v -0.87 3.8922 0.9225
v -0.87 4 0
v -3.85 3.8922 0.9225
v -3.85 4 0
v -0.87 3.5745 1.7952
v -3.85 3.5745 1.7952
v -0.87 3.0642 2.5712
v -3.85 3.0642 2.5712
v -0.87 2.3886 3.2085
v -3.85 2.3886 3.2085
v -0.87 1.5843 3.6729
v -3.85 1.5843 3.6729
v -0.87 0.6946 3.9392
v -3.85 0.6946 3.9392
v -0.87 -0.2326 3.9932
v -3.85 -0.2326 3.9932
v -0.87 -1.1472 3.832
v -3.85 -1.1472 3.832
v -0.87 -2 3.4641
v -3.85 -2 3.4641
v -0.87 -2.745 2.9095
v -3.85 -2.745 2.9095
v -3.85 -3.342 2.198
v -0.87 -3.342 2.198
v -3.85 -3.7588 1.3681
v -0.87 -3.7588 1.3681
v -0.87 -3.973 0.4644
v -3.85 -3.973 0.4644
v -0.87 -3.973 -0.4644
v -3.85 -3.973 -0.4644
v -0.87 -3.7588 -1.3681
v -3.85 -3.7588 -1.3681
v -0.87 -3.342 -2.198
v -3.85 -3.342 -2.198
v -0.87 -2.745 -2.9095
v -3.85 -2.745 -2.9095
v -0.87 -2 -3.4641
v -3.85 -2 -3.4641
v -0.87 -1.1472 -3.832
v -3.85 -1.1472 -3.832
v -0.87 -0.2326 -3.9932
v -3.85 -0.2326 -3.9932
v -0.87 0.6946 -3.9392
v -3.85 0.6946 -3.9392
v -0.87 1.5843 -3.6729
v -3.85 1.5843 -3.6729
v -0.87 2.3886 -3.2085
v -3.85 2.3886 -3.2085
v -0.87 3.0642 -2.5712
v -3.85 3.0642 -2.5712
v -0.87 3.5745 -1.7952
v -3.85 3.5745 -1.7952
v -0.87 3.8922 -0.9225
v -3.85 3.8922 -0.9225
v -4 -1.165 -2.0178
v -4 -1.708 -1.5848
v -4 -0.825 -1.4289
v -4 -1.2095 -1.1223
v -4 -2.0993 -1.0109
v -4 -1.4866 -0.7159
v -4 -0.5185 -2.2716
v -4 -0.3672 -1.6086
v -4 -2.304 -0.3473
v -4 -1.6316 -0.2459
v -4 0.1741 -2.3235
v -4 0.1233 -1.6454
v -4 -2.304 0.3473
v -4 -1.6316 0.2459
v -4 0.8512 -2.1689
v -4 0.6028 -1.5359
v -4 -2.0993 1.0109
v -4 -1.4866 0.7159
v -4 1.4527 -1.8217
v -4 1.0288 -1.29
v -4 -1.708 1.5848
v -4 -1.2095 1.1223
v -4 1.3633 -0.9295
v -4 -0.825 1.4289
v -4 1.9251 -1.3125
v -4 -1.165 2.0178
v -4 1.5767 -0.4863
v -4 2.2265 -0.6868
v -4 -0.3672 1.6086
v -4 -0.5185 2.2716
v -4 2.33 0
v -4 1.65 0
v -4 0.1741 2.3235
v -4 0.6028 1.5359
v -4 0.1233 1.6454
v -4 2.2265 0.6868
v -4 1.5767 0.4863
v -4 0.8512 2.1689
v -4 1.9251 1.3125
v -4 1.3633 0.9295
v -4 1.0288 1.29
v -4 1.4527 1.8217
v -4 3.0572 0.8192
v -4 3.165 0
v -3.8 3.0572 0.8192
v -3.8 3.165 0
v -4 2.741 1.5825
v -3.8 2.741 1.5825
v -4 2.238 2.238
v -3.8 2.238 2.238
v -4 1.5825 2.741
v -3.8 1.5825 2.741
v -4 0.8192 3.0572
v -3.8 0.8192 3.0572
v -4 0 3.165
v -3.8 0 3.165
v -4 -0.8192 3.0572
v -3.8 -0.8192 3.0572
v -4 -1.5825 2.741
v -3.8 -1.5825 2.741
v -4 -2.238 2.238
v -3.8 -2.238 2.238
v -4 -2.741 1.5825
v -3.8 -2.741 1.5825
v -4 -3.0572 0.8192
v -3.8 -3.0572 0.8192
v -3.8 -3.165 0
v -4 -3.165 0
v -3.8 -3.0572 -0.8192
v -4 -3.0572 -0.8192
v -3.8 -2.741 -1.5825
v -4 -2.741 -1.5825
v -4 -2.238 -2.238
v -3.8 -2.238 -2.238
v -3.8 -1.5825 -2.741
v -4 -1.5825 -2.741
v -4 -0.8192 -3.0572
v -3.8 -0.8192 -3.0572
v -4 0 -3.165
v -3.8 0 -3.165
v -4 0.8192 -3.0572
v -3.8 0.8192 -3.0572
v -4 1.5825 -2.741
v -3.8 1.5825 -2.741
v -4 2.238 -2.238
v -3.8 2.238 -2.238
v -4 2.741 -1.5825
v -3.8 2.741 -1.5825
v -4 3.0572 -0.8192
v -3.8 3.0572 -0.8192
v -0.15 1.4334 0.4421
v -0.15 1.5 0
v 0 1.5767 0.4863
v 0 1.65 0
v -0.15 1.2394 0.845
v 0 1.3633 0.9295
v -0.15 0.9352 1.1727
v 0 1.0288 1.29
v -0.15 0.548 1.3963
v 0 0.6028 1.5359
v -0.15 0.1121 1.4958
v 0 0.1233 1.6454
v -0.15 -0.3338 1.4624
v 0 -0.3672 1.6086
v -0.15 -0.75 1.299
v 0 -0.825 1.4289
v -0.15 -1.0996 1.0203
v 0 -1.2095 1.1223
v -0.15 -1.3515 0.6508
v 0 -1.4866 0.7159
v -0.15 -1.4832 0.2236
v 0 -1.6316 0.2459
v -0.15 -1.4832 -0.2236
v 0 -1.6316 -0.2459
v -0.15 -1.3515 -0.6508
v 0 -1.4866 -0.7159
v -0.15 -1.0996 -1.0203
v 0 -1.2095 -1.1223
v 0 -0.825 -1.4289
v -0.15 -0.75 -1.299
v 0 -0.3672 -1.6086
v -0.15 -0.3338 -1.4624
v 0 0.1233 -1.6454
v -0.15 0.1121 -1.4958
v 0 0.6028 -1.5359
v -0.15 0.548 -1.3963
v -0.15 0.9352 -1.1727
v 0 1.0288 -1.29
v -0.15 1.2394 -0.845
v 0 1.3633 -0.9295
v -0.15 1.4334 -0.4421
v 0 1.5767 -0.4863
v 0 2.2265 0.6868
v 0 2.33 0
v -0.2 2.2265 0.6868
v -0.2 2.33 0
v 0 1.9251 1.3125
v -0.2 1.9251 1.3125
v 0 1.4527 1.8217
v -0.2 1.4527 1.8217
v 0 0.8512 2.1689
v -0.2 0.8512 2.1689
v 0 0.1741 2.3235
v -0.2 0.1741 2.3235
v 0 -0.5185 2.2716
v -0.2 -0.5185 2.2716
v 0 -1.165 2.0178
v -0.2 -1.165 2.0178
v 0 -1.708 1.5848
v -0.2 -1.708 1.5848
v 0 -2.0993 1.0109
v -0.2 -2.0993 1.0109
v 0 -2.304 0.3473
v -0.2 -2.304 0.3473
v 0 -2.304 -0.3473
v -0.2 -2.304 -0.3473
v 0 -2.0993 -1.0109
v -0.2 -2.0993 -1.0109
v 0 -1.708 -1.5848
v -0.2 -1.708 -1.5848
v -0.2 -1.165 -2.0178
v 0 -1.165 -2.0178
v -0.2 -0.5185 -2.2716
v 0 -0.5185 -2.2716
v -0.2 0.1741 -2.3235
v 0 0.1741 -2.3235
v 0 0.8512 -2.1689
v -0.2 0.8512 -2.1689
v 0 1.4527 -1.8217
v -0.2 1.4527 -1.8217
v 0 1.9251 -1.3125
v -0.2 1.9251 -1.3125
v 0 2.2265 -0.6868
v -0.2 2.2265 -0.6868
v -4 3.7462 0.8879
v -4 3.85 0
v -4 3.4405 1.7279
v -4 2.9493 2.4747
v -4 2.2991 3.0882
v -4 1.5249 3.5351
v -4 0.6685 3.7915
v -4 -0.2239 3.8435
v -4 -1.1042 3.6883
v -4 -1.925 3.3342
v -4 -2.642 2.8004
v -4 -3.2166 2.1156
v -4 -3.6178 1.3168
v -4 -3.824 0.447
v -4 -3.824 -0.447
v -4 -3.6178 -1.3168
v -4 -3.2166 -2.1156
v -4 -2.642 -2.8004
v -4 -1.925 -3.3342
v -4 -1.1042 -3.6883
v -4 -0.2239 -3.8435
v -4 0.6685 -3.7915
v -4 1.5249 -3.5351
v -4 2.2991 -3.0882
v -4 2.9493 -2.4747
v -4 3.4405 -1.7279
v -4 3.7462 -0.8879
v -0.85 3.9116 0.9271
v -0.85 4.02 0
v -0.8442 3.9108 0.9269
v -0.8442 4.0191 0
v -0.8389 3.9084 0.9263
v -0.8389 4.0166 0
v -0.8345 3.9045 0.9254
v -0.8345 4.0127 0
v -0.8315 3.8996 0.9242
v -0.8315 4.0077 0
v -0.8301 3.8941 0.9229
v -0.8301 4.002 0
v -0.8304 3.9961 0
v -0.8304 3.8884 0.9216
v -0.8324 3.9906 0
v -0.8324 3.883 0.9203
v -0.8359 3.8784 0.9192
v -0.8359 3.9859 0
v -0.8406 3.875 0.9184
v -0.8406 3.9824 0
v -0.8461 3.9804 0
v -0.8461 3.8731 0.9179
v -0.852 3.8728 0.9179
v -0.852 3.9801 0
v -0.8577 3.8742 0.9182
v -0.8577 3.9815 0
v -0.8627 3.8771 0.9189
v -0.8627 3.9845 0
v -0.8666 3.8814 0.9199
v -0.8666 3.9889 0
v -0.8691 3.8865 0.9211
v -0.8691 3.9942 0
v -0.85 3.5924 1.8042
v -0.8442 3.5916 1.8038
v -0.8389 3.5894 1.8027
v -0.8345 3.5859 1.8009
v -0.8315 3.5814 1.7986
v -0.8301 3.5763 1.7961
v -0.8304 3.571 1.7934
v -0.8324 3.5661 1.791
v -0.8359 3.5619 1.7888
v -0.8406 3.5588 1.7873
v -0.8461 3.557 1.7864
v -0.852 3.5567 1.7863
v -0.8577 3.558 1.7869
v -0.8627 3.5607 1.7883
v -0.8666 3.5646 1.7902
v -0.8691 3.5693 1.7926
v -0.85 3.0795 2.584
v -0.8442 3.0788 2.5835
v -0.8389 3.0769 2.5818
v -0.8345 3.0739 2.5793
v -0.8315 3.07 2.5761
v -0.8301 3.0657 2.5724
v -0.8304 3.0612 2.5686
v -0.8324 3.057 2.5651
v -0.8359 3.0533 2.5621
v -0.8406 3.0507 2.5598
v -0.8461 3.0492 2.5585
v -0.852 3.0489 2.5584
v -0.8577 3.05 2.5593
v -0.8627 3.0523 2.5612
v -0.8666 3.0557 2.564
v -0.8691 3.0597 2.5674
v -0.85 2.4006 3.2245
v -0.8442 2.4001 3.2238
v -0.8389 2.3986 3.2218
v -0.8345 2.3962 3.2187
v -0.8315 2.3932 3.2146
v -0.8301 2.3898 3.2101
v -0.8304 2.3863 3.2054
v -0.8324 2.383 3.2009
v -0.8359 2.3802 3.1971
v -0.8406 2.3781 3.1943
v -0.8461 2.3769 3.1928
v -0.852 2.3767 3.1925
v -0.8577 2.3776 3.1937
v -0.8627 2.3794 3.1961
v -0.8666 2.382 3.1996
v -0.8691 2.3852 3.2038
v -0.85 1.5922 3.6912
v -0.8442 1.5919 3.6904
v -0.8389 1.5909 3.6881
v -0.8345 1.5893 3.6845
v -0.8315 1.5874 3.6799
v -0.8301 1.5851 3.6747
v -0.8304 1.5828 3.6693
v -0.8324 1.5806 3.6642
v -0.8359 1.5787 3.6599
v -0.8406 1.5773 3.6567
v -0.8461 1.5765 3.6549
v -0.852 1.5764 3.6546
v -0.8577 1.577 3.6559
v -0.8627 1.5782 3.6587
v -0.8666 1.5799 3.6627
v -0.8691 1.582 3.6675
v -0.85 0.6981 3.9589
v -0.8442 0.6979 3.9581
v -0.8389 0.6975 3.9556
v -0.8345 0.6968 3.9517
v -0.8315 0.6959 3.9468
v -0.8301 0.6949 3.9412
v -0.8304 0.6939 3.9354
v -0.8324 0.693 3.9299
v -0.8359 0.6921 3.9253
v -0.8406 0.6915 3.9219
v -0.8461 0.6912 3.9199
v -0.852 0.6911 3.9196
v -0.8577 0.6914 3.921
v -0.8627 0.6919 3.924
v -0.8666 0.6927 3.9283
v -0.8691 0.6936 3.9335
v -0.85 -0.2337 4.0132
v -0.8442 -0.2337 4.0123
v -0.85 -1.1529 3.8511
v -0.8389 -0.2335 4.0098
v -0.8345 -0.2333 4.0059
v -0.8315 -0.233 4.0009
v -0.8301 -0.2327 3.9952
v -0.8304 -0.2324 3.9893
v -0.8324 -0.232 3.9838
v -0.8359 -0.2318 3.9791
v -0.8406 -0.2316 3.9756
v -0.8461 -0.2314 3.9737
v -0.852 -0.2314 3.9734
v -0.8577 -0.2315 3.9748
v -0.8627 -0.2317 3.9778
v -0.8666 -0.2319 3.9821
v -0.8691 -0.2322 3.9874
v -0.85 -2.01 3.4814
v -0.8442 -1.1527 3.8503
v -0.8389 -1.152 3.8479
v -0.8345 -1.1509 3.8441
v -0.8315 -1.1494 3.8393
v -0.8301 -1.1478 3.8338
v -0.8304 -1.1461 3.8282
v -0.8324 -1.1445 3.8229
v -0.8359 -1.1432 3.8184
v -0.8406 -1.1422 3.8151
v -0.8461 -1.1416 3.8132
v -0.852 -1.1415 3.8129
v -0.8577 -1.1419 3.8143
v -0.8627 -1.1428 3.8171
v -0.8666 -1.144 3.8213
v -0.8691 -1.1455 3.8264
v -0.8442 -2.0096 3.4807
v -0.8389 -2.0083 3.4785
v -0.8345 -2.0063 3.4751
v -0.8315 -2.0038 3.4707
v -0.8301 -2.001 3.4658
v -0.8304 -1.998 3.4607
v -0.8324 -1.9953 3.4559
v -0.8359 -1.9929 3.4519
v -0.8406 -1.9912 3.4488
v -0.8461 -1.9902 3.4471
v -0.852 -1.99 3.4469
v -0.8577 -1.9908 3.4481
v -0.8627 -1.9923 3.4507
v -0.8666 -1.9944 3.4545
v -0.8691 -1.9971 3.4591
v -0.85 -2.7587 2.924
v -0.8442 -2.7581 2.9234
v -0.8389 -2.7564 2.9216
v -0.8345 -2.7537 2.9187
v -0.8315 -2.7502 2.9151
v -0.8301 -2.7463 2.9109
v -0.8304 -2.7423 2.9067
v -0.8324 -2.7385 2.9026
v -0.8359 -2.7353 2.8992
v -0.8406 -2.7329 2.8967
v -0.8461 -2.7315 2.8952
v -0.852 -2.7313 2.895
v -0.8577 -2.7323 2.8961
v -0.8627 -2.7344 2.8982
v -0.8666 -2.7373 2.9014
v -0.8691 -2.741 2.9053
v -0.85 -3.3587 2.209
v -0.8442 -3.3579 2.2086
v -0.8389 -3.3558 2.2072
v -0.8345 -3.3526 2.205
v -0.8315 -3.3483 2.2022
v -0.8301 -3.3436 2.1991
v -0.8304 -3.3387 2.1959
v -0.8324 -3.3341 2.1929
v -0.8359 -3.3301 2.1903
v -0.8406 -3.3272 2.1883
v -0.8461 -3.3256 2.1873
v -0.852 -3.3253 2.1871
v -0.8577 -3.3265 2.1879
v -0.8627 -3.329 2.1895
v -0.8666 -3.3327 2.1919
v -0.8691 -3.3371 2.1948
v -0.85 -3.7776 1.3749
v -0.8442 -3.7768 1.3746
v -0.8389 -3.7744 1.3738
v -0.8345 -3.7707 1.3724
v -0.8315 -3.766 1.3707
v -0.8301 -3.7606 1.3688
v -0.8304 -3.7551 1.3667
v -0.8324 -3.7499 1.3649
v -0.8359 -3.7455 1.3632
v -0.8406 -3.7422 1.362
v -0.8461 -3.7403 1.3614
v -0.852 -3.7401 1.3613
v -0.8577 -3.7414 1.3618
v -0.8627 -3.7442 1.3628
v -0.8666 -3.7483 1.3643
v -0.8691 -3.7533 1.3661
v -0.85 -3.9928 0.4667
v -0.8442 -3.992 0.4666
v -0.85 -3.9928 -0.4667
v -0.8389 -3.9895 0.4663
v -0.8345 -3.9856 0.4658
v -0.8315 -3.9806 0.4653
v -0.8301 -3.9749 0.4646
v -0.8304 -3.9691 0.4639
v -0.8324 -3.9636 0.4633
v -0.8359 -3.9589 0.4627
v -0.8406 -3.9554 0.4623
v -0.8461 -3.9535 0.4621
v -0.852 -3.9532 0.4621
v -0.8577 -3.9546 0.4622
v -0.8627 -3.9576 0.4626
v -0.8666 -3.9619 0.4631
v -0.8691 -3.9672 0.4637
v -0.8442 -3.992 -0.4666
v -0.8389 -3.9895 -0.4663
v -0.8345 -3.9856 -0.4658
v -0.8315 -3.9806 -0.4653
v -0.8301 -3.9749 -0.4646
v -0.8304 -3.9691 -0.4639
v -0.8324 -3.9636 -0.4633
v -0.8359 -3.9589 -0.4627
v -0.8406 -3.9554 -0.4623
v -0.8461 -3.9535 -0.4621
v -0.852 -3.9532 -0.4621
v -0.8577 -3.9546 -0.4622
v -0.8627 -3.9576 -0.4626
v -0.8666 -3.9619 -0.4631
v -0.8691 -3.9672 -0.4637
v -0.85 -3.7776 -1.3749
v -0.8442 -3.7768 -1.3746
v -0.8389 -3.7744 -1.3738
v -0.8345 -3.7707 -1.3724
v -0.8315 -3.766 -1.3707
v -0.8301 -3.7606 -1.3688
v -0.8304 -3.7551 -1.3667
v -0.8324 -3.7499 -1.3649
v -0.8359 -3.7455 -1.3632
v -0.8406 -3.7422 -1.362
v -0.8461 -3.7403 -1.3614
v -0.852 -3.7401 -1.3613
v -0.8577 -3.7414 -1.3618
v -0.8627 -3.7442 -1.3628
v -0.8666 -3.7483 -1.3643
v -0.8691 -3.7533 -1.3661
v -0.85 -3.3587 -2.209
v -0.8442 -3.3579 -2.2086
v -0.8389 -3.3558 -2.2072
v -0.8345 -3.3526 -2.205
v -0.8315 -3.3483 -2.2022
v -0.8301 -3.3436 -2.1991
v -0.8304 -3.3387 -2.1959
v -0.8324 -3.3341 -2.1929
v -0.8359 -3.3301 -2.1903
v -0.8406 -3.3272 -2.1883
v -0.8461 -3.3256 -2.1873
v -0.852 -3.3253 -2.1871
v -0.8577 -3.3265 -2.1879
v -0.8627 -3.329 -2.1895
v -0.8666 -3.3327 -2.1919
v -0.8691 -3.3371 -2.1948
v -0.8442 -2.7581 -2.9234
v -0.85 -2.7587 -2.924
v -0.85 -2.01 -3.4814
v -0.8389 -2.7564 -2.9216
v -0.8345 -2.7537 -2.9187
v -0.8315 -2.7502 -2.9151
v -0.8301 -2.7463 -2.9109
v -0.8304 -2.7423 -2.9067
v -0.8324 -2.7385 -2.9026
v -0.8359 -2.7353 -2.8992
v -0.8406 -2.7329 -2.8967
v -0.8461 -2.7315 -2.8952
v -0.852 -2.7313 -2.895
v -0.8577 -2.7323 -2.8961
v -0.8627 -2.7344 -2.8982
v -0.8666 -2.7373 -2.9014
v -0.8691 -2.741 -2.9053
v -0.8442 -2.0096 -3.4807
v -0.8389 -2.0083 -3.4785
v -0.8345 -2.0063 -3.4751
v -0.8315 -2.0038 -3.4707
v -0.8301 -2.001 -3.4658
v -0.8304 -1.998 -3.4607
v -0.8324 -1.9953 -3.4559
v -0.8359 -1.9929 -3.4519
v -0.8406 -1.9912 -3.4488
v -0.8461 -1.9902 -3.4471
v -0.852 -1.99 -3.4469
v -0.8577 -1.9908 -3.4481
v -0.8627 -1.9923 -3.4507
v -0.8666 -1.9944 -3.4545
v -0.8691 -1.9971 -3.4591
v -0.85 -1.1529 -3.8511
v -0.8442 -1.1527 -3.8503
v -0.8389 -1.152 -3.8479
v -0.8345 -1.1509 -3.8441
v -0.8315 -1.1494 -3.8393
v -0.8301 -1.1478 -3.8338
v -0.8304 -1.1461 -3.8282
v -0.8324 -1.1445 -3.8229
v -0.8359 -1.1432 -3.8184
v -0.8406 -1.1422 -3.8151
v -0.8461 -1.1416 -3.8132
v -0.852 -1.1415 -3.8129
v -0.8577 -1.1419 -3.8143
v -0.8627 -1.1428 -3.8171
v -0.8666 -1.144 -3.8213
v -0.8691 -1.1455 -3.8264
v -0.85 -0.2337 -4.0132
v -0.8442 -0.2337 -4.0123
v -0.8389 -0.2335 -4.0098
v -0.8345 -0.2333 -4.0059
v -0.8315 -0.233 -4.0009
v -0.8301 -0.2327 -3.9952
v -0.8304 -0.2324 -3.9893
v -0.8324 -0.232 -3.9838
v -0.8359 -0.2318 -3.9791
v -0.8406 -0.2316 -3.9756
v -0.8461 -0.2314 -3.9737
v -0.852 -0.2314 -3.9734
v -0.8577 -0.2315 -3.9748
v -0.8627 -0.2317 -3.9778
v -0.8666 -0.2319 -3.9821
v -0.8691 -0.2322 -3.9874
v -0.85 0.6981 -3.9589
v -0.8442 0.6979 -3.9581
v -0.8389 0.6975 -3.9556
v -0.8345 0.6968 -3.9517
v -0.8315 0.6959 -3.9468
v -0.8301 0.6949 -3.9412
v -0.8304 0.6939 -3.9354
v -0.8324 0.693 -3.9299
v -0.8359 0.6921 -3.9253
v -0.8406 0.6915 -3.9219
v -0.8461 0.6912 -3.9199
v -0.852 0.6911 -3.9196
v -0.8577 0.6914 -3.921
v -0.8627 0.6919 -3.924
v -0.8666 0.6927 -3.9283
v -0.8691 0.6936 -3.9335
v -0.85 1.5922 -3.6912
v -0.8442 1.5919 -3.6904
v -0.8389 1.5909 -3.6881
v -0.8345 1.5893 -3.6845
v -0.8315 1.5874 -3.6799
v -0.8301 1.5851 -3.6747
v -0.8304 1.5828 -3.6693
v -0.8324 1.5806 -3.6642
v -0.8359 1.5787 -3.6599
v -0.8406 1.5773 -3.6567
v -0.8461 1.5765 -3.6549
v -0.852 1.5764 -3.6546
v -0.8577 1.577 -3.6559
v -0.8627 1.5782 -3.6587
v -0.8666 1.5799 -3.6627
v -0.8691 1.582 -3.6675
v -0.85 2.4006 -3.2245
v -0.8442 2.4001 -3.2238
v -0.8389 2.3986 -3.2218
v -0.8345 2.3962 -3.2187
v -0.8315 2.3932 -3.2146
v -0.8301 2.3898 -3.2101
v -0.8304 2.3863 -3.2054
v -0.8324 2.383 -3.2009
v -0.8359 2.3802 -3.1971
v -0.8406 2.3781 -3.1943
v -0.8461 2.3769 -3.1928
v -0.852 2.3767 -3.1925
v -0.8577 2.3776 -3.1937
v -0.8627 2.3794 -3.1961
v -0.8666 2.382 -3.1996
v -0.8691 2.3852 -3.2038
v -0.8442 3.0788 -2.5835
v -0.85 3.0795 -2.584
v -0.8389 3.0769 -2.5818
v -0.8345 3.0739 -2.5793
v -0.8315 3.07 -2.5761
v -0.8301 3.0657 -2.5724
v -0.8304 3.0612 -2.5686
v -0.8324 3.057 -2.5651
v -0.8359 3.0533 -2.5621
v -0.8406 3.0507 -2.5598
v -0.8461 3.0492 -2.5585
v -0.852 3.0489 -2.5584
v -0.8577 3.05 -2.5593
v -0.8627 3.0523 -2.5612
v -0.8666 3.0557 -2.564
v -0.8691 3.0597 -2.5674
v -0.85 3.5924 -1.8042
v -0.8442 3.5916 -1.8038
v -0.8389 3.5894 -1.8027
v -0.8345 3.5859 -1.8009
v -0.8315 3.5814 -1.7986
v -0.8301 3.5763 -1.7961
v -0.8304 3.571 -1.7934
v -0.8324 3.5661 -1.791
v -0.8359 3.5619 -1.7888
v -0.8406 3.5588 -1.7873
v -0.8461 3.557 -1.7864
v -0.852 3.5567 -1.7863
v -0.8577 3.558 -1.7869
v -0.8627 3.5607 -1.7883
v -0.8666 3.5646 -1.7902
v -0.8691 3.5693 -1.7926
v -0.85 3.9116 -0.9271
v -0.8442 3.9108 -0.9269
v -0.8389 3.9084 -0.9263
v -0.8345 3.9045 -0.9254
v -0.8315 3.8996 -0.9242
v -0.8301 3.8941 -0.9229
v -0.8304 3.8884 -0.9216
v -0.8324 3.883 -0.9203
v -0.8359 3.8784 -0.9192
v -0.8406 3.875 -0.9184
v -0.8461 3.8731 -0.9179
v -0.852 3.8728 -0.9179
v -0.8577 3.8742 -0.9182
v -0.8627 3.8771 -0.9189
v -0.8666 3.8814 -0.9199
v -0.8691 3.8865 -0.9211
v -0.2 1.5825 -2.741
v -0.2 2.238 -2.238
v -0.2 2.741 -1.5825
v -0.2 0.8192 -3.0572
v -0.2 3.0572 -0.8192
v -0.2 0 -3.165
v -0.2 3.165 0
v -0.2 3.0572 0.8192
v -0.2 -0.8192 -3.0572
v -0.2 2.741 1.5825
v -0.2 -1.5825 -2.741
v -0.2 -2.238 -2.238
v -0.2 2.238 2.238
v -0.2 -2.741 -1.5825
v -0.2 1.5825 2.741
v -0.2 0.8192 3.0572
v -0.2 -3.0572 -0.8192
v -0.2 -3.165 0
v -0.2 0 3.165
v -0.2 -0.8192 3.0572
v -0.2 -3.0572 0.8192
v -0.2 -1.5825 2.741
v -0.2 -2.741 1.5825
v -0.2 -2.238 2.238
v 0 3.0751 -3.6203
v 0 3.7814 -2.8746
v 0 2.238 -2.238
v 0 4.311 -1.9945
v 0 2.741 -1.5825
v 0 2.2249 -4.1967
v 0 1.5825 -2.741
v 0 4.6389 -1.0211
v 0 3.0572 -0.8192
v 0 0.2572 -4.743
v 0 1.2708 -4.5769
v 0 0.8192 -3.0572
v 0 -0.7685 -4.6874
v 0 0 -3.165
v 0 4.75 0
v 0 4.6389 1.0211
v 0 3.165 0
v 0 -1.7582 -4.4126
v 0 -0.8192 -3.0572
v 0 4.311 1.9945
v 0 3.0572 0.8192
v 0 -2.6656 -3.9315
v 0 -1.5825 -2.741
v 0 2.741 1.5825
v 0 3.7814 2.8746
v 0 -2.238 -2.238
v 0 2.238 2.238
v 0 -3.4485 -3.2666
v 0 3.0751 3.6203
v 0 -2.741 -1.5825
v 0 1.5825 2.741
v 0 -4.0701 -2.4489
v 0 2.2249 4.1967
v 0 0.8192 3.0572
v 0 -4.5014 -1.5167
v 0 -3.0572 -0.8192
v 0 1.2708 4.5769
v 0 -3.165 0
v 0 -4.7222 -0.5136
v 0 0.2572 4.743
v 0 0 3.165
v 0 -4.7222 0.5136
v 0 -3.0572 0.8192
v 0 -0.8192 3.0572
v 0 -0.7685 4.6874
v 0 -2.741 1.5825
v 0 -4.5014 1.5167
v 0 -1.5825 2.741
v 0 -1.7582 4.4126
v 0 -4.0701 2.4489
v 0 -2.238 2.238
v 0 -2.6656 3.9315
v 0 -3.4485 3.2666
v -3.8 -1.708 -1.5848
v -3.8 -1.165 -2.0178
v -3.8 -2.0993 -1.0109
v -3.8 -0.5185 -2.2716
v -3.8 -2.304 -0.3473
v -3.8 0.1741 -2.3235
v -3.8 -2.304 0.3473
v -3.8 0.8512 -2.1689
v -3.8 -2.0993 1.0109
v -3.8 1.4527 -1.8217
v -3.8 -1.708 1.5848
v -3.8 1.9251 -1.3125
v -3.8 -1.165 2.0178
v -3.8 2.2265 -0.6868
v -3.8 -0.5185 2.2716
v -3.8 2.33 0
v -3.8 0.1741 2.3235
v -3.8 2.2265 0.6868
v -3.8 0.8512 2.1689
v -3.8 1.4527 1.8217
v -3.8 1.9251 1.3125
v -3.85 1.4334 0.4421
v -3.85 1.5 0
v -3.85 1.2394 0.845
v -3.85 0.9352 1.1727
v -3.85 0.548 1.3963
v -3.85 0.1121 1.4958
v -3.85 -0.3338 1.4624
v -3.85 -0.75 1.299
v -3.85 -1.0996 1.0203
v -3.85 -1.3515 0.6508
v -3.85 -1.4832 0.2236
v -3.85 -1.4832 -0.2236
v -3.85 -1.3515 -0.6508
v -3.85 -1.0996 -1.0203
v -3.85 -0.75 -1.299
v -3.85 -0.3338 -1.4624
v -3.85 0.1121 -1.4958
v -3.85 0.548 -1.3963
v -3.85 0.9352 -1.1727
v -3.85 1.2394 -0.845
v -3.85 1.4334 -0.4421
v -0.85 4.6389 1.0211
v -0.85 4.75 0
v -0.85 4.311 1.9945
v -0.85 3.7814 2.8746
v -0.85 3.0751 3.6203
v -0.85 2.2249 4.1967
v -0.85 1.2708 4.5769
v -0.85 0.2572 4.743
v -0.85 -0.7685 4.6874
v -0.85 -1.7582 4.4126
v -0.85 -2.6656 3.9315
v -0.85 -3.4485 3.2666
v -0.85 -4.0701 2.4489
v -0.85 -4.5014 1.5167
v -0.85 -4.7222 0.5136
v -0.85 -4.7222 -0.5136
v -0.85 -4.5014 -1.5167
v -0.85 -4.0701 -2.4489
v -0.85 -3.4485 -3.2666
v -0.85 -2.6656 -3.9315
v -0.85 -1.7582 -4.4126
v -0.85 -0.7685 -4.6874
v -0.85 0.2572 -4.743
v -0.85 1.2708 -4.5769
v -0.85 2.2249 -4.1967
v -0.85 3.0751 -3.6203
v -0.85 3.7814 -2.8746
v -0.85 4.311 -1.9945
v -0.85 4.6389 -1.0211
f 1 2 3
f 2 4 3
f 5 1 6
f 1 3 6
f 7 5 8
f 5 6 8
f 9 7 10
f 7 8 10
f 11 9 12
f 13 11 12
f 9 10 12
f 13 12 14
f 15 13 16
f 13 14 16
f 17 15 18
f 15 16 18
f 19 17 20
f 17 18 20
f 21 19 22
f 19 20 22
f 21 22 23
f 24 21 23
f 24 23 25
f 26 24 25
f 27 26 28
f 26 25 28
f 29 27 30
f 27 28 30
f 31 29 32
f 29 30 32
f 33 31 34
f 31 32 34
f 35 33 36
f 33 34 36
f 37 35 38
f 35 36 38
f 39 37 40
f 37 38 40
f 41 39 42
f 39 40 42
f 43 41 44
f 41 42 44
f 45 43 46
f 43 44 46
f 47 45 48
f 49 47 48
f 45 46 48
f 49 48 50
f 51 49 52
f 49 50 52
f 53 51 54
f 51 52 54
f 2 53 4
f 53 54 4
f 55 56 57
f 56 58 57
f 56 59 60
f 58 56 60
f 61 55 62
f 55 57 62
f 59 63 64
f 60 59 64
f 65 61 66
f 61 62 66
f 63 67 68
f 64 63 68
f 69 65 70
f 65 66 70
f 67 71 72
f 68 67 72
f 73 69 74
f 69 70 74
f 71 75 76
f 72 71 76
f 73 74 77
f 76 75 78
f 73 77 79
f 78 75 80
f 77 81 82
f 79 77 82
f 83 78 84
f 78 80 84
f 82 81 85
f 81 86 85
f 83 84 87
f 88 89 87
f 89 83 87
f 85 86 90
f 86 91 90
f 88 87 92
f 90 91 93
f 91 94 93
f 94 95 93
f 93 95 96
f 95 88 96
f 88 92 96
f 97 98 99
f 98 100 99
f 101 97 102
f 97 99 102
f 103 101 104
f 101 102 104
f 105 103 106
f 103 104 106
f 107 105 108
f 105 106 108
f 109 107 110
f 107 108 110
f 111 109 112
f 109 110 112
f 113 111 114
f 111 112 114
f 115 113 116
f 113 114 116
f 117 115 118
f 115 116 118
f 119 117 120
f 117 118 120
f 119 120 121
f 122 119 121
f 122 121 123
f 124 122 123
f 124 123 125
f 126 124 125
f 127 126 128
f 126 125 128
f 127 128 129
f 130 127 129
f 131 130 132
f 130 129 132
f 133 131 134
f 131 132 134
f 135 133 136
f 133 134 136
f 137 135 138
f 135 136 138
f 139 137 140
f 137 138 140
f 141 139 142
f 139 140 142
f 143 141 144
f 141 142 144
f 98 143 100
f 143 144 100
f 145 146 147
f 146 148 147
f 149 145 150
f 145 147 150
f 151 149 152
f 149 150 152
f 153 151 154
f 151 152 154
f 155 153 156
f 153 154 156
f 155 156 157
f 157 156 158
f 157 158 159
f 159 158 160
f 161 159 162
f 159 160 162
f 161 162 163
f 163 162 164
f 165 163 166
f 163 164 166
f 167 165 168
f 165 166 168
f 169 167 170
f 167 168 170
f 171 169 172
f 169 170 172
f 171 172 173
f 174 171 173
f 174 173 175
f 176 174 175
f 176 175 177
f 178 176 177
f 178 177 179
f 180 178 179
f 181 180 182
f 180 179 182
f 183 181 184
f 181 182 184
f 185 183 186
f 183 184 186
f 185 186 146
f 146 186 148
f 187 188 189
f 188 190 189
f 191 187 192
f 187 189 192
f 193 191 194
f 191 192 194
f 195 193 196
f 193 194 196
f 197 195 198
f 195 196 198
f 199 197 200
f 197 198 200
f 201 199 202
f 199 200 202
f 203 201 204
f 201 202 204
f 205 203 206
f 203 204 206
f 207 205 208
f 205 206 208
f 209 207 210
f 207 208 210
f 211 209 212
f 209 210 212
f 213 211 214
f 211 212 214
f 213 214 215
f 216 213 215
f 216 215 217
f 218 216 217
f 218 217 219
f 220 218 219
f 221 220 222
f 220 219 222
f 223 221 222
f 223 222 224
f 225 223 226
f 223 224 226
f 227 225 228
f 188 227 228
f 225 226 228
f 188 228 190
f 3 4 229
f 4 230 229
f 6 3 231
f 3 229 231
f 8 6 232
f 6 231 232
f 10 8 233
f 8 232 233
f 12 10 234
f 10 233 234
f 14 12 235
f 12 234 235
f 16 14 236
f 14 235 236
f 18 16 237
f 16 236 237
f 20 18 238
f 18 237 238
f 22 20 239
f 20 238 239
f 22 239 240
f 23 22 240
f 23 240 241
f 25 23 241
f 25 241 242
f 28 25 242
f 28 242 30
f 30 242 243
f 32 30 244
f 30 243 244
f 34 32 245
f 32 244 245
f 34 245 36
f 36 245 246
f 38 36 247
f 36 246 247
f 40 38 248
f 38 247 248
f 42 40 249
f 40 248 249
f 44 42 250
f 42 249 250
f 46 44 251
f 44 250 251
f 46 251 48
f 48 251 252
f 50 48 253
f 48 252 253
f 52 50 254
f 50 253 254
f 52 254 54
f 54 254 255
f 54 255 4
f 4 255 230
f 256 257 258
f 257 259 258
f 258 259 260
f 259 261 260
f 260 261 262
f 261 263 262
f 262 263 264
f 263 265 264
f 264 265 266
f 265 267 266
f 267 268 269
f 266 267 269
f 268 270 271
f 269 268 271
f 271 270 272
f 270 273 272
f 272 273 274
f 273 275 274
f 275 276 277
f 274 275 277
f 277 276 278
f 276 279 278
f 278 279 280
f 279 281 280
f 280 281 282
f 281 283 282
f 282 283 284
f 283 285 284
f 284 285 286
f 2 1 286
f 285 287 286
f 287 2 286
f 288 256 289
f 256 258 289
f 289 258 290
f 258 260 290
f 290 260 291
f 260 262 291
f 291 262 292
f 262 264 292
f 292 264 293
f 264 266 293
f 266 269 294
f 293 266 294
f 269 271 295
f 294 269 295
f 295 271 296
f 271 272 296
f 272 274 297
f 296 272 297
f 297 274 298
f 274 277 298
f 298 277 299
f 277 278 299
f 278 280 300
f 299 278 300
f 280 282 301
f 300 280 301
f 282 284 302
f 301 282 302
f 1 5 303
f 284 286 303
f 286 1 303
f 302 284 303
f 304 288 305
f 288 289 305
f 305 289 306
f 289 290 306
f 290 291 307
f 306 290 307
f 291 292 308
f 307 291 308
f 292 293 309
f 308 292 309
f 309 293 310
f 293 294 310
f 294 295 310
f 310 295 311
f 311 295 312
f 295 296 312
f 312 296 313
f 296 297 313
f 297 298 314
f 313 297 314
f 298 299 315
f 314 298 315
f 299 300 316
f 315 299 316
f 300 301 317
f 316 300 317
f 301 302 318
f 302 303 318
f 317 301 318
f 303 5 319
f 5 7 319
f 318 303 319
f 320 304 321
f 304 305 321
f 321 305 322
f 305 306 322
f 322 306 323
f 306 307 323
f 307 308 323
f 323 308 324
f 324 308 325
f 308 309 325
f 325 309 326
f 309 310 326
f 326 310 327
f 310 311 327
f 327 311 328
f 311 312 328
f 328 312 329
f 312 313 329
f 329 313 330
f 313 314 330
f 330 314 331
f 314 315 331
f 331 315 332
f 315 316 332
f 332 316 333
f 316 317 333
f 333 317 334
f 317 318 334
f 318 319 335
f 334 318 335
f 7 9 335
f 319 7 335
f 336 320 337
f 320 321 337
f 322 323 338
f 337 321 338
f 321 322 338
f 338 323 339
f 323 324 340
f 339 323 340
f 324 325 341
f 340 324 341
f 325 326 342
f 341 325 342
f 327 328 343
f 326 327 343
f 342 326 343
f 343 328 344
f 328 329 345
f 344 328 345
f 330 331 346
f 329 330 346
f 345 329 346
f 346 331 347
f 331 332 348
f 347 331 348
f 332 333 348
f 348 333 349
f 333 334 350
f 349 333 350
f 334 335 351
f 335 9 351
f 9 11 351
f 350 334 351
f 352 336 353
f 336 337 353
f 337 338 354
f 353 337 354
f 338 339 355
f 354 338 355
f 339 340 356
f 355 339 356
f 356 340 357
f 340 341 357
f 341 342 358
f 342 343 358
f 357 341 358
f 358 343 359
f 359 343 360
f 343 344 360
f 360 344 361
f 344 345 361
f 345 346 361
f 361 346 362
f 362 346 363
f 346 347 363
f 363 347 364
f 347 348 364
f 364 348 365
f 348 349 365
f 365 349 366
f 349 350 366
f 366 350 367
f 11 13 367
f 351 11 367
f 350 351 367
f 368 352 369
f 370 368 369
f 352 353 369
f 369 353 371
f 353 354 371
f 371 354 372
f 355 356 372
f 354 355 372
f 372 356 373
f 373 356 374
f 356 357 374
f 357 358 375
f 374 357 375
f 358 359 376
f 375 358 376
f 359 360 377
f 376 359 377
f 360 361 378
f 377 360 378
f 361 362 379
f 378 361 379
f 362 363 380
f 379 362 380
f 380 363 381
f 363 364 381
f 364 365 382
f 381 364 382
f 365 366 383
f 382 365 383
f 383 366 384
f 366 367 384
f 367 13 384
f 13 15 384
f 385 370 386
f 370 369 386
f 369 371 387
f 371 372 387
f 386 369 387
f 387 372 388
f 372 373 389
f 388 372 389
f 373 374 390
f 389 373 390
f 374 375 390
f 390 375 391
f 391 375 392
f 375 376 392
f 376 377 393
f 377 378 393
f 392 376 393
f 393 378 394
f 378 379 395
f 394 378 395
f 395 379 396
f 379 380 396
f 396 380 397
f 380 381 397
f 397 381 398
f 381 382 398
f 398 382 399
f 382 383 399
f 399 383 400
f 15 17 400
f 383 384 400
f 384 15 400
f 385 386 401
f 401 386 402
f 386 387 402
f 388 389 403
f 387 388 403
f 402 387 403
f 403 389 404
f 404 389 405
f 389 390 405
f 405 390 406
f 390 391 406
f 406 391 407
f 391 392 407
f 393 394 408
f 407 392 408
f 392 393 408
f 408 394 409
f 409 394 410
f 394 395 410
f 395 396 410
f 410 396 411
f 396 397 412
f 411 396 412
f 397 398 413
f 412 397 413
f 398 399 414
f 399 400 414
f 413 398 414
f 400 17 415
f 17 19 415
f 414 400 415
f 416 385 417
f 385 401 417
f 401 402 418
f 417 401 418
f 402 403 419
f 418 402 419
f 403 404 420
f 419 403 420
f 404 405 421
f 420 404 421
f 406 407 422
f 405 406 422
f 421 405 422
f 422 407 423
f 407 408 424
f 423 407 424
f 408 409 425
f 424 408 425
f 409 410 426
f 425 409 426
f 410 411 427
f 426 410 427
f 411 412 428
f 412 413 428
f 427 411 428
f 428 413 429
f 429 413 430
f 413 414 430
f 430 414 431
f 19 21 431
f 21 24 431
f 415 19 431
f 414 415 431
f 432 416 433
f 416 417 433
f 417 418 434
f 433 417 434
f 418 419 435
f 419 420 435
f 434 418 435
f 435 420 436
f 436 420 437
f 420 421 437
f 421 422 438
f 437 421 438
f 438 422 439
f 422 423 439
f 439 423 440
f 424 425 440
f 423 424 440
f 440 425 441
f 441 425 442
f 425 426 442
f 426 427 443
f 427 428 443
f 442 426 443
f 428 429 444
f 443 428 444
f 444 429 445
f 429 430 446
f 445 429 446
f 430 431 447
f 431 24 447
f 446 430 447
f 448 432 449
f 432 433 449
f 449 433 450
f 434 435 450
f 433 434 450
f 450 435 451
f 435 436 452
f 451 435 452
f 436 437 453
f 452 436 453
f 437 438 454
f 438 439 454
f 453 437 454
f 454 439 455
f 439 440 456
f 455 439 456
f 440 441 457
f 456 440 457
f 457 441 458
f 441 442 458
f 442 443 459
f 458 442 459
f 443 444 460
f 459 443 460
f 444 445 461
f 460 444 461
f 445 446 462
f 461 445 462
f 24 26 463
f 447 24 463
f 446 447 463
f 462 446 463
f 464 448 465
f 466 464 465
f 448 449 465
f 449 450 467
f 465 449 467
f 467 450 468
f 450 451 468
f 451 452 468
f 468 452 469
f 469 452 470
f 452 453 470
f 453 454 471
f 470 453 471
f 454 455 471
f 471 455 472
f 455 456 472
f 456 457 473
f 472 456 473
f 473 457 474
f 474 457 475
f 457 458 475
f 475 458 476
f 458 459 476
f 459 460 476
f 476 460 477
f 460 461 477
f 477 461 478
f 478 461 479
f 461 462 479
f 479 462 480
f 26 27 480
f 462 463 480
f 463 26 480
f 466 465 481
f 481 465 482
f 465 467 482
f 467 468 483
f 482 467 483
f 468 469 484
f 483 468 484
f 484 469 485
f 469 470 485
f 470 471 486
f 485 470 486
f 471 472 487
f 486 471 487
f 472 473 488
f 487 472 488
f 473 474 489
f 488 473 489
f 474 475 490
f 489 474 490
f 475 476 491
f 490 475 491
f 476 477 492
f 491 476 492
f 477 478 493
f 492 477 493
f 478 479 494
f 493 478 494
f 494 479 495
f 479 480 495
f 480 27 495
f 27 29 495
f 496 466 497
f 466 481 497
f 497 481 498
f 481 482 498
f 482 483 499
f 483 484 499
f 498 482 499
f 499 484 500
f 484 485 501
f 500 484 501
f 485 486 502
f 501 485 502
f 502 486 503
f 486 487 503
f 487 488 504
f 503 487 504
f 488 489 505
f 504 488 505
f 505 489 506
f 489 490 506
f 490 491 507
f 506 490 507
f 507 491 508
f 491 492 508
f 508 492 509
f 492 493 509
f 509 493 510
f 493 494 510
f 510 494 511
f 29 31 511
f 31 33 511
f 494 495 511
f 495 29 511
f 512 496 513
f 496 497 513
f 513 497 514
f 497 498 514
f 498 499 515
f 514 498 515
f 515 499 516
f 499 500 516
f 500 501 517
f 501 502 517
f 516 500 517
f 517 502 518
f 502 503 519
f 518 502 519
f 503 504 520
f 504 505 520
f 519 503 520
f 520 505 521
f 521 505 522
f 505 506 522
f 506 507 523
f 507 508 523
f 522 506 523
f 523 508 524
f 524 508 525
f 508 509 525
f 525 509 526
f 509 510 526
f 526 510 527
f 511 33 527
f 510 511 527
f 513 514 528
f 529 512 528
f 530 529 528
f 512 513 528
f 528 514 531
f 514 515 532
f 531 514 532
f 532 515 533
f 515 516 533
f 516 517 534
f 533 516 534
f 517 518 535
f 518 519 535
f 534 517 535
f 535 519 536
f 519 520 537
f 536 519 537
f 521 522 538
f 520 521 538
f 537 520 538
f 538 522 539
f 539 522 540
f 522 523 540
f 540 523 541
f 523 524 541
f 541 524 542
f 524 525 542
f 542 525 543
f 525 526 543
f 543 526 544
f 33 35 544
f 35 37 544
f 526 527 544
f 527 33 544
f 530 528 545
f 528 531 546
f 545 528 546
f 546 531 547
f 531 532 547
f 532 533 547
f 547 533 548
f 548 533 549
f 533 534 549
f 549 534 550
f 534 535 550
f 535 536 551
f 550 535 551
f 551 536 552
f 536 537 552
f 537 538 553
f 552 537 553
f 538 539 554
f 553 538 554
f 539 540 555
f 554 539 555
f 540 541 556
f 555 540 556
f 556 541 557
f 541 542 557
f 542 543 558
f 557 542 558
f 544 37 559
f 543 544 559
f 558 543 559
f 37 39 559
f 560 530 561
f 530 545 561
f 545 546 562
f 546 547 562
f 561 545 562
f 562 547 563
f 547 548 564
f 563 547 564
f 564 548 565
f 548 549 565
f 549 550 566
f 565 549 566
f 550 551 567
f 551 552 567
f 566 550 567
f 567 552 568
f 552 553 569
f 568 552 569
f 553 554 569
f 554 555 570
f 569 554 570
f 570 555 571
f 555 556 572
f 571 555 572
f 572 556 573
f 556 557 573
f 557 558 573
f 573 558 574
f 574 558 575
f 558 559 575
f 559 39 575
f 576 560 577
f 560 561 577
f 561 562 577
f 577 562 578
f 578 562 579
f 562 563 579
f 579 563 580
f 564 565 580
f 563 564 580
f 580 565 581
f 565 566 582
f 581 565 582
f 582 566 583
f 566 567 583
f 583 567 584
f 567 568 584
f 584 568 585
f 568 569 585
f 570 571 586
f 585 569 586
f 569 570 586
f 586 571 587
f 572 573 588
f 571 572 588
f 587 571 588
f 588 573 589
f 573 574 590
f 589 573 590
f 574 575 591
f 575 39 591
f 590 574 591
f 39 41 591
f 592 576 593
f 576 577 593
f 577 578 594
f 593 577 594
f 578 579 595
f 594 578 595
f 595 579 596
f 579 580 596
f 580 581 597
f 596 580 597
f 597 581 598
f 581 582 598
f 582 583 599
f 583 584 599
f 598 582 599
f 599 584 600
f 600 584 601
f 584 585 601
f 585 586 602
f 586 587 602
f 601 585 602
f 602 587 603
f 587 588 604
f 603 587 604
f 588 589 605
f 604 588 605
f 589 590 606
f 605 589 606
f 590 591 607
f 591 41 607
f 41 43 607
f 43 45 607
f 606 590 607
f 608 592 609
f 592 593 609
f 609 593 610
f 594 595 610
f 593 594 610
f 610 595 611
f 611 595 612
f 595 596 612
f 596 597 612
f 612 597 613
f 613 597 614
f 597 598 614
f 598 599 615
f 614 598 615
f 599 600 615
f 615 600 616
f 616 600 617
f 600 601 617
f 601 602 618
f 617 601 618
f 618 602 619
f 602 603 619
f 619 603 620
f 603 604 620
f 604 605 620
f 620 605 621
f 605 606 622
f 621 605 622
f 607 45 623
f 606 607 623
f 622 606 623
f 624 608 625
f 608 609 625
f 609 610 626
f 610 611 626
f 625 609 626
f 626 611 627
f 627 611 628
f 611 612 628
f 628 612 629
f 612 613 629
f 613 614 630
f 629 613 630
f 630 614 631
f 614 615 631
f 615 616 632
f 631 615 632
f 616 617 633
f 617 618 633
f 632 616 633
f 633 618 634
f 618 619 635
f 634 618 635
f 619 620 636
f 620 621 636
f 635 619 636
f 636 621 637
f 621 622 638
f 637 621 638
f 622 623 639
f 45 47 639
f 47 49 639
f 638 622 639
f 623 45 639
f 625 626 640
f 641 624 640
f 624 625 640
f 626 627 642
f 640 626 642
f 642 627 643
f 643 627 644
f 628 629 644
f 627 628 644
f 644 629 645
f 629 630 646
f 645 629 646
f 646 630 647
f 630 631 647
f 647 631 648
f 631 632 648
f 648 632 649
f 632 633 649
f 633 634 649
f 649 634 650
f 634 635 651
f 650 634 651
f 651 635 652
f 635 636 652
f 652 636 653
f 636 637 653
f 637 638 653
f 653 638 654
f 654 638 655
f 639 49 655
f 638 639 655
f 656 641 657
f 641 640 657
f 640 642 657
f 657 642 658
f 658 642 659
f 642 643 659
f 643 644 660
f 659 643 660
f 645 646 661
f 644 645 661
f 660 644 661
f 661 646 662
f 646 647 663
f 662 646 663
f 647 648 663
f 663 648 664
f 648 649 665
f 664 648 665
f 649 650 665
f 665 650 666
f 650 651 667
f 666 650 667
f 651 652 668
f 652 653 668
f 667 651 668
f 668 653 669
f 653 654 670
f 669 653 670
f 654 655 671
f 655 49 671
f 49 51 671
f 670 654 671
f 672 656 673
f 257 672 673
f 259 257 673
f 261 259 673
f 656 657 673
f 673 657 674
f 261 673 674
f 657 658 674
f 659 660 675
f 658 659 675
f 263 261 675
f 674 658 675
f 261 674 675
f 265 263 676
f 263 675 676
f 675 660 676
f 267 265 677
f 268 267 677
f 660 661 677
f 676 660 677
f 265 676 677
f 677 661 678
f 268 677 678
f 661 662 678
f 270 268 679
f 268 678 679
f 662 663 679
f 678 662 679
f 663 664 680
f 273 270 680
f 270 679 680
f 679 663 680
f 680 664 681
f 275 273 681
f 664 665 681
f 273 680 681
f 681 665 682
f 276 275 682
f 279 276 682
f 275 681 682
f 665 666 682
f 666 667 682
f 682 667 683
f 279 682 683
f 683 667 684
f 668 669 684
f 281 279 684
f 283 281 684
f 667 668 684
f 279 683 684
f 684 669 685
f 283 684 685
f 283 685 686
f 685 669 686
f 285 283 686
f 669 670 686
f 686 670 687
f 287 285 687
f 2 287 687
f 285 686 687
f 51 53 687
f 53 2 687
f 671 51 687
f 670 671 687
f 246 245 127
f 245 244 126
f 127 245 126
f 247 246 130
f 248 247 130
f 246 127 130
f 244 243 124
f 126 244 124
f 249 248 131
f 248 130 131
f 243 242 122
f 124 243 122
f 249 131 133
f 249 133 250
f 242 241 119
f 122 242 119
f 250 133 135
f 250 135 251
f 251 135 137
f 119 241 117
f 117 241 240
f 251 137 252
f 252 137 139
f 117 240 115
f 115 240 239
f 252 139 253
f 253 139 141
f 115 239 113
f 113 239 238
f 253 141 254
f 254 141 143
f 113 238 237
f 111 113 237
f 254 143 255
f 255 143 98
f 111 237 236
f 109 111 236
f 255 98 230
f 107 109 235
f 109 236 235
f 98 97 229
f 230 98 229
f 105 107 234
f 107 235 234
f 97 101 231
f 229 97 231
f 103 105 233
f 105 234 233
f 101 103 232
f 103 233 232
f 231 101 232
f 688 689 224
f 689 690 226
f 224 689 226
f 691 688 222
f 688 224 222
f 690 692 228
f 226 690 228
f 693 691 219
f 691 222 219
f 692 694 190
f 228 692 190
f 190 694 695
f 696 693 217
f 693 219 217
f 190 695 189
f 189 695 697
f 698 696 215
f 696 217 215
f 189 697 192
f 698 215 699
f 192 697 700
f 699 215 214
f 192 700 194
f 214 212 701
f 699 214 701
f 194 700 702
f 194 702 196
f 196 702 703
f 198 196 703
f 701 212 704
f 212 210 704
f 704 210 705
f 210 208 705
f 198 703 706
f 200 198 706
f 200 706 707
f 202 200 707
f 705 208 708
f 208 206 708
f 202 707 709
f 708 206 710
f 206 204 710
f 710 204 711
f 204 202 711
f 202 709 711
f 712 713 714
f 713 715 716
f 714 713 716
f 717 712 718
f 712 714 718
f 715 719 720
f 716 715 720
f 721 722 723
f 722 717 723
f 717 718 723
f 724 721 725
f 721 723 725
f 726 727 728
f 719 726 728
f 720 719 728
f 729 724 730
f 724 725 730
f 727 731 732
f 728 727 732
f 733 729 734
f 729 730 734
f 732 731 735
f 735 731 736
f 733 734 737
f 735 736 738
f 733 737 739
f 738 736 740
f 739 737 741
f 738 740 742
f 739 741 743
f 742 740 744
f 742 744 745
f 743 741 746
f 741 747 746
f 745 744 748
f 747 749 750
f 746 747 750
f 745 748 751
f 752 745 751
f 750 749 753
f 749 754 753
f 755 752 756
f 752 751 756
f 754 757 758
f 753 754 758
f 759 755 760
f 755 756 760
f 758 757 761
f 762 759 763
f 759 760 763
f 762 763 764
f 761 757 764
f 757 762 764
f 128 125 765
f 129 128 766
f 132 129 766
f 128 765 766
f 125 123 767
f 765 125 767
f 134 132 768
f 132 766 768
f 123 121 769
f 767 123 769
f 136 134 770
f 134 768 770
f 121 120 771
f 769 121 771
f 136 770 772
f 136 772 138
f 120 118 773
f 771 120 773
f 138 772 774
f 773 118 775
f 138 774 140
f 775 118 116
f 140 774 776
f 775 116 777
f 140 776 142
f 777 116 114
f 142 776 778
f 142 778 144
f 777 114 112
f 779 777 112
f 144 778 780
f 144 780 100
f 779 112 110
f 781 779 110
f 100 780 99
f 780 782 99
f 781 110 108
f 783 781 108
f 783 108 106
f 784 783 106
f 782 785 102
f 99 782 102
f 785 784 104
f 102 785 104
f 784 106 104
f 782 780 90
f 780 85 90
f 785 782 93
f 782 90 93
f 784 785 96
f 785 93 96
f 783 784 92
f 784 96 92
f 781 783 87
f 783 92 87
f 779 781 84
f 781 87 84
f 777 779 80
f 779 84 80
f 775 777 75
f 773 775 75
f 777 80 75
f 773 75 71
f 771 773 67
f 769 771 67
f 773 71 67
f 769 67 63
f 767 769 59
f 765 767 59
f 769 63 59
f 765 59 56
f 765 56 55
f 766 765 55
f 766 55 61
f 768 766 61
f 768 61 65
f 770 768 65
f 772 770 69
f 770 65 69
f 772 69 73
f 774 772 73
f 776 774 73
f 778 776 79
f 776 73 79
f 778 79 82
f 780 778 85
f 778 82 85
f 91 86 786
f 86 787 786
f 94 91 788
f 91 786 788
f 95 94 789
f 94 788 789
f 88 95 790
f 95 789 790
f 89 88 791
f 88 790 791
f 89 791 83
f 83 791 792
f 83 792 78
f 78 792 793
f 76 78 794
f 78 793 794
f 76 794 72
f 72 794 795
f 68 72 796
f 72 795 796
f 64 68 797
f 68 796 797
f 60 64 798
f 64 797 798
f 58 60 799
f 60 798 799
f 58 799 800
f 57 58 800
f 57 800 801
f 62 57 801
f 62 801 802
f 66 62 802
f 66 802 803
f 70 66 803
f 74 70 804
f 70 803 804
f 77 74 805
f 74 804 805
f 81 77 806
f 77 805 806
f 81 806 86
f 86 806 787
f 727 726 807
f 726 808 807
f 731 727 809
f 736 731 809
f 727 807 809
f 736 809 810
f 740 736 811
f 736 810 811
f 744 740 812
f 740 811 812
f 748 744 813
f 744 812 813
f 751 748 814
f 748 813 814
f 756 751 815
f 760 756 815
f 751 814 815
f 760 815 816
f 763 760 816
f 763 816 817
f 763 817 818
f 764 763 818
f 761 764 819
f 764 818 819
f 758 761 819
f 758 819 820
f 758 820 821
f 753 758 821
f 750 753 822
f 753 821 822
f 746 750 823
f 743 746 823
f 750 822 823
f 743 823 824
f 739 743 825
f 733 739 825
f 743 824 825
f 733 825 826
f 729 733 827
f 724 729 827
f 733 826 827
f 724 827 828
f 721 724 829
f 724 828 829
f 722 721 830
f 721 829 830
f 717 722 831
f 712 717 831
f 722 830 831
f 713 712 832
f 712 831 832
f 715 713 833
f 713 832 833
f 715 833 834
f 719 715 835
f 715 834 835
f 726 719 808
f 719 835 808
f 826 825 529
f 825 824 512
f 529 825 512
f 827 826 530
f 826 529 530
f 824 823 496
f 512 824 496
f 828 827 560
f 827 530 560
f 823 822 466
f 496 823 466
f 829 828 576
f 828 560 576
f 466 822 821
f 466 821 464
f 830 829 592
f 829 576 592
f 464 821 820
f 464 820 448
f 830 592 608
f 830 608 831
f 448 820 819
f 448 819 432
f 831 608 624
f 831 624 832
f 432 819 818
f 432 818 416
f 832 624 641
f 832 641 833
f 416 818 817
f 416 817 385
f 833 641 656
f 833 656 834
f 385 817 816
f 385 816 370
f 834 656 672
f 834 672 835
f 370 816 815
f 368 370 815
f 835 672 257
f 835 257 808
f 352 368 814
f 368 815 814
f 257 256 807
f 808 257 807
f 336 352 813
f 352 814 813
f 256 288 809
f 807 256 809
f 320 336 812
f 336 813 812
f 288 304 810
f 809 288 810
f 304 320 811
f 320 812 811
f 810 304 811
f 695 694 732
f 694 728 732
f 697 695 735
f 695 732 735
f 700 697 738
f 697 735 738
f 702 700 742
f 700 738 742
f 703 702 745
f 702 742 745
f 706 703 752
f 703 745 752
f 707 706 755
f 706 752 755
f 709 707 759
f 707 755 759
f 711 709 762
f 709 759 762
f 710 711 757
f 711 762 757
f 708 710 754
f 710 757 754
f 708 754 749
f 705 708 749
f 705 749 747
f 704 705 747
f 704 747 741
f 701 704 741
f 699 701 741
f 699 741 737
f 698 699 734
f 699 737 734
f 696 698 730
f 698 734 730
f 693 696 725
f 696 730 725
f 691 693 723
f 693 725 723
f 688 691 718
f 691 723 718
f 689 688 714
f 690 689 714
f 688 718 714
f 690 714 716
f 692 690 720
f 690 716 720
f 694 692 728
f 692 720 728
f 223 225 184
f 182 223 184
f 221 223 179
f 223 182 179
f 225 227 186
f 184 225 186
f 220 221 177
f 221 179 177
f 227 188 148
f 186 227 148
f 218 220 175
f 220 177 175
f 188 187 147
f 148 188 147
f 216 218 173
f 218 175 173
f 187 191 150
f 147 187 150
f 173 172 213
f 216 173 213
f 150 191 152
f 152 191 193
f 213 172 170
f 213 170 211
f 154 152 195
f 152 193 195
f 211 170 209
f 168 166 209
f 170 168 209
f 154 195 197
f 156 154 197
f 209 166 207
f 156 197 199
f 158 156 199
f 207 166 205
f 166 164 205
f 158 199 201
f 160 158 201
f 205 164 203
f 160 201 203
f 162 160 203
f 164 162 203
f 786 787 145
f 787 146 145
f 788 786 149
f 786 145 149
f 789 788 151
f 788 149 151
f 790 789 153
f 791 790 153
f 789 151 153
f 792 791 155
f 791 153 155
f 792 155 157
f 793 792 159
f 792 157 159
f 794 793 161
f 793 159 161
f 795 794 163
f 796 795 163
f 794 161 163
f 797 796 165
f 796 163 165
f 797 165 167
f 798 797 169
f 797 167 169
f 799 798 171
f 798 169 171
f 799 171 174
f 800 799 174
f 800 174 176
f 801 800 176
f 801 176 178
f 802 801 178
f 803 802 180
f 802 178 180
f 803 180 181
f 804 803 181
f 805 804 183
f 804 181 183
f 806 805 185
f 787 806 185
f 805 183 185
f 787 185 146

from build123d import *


with BuildPart() as part:
    # Schizzo1 → Rivoluzione1 (revolve)
    with BuildSketch(Plane.XY):
        with BuildLine():
            Line((-3.8, 3.165), (-3.8, 2.33))
            Line((-3.8, 2.33), (-4, 2.33))
            Line((-4, 2.33), (-4, 1.65))
            Line((-4, 1.65), (-3.85, 1.5))
            Line((-3.85, 1.5), (-0.15, 1.5))
            Line((-0.15, 1.5), (0, 1.65))
            Line((0, 1.65), (0, 2.33))
            Line((0, 2.33), (-0.2, 2.33))
            Line((-0.2, 2.33), (-0.2, 3.165))
            Line((-0.2, 3.165), (0, 3.165))
            Line((0, 3.165), (0, 4.75))
            Line((0, 4.75), (-0.85, 4.75))
            Line((-0.85, 4.75), (-0.85, 4.02))
            ThreePointArc((-0.85, 4.02), (-0.835857864, 3.985857864), (-0.87, 4))
            Line((-0.87, 4), (-3.85, 4))
            Line((-3.85, 4), (-4, 3.85))
            Line((-4, 3.85), (-4, 3.165))
            Line((-4, 3.165), (-3.8, 3.165))
        make_face()
    revolve(axis=Axis((-4, 0, 0), (1, 0, 0)))


solid = part.part
